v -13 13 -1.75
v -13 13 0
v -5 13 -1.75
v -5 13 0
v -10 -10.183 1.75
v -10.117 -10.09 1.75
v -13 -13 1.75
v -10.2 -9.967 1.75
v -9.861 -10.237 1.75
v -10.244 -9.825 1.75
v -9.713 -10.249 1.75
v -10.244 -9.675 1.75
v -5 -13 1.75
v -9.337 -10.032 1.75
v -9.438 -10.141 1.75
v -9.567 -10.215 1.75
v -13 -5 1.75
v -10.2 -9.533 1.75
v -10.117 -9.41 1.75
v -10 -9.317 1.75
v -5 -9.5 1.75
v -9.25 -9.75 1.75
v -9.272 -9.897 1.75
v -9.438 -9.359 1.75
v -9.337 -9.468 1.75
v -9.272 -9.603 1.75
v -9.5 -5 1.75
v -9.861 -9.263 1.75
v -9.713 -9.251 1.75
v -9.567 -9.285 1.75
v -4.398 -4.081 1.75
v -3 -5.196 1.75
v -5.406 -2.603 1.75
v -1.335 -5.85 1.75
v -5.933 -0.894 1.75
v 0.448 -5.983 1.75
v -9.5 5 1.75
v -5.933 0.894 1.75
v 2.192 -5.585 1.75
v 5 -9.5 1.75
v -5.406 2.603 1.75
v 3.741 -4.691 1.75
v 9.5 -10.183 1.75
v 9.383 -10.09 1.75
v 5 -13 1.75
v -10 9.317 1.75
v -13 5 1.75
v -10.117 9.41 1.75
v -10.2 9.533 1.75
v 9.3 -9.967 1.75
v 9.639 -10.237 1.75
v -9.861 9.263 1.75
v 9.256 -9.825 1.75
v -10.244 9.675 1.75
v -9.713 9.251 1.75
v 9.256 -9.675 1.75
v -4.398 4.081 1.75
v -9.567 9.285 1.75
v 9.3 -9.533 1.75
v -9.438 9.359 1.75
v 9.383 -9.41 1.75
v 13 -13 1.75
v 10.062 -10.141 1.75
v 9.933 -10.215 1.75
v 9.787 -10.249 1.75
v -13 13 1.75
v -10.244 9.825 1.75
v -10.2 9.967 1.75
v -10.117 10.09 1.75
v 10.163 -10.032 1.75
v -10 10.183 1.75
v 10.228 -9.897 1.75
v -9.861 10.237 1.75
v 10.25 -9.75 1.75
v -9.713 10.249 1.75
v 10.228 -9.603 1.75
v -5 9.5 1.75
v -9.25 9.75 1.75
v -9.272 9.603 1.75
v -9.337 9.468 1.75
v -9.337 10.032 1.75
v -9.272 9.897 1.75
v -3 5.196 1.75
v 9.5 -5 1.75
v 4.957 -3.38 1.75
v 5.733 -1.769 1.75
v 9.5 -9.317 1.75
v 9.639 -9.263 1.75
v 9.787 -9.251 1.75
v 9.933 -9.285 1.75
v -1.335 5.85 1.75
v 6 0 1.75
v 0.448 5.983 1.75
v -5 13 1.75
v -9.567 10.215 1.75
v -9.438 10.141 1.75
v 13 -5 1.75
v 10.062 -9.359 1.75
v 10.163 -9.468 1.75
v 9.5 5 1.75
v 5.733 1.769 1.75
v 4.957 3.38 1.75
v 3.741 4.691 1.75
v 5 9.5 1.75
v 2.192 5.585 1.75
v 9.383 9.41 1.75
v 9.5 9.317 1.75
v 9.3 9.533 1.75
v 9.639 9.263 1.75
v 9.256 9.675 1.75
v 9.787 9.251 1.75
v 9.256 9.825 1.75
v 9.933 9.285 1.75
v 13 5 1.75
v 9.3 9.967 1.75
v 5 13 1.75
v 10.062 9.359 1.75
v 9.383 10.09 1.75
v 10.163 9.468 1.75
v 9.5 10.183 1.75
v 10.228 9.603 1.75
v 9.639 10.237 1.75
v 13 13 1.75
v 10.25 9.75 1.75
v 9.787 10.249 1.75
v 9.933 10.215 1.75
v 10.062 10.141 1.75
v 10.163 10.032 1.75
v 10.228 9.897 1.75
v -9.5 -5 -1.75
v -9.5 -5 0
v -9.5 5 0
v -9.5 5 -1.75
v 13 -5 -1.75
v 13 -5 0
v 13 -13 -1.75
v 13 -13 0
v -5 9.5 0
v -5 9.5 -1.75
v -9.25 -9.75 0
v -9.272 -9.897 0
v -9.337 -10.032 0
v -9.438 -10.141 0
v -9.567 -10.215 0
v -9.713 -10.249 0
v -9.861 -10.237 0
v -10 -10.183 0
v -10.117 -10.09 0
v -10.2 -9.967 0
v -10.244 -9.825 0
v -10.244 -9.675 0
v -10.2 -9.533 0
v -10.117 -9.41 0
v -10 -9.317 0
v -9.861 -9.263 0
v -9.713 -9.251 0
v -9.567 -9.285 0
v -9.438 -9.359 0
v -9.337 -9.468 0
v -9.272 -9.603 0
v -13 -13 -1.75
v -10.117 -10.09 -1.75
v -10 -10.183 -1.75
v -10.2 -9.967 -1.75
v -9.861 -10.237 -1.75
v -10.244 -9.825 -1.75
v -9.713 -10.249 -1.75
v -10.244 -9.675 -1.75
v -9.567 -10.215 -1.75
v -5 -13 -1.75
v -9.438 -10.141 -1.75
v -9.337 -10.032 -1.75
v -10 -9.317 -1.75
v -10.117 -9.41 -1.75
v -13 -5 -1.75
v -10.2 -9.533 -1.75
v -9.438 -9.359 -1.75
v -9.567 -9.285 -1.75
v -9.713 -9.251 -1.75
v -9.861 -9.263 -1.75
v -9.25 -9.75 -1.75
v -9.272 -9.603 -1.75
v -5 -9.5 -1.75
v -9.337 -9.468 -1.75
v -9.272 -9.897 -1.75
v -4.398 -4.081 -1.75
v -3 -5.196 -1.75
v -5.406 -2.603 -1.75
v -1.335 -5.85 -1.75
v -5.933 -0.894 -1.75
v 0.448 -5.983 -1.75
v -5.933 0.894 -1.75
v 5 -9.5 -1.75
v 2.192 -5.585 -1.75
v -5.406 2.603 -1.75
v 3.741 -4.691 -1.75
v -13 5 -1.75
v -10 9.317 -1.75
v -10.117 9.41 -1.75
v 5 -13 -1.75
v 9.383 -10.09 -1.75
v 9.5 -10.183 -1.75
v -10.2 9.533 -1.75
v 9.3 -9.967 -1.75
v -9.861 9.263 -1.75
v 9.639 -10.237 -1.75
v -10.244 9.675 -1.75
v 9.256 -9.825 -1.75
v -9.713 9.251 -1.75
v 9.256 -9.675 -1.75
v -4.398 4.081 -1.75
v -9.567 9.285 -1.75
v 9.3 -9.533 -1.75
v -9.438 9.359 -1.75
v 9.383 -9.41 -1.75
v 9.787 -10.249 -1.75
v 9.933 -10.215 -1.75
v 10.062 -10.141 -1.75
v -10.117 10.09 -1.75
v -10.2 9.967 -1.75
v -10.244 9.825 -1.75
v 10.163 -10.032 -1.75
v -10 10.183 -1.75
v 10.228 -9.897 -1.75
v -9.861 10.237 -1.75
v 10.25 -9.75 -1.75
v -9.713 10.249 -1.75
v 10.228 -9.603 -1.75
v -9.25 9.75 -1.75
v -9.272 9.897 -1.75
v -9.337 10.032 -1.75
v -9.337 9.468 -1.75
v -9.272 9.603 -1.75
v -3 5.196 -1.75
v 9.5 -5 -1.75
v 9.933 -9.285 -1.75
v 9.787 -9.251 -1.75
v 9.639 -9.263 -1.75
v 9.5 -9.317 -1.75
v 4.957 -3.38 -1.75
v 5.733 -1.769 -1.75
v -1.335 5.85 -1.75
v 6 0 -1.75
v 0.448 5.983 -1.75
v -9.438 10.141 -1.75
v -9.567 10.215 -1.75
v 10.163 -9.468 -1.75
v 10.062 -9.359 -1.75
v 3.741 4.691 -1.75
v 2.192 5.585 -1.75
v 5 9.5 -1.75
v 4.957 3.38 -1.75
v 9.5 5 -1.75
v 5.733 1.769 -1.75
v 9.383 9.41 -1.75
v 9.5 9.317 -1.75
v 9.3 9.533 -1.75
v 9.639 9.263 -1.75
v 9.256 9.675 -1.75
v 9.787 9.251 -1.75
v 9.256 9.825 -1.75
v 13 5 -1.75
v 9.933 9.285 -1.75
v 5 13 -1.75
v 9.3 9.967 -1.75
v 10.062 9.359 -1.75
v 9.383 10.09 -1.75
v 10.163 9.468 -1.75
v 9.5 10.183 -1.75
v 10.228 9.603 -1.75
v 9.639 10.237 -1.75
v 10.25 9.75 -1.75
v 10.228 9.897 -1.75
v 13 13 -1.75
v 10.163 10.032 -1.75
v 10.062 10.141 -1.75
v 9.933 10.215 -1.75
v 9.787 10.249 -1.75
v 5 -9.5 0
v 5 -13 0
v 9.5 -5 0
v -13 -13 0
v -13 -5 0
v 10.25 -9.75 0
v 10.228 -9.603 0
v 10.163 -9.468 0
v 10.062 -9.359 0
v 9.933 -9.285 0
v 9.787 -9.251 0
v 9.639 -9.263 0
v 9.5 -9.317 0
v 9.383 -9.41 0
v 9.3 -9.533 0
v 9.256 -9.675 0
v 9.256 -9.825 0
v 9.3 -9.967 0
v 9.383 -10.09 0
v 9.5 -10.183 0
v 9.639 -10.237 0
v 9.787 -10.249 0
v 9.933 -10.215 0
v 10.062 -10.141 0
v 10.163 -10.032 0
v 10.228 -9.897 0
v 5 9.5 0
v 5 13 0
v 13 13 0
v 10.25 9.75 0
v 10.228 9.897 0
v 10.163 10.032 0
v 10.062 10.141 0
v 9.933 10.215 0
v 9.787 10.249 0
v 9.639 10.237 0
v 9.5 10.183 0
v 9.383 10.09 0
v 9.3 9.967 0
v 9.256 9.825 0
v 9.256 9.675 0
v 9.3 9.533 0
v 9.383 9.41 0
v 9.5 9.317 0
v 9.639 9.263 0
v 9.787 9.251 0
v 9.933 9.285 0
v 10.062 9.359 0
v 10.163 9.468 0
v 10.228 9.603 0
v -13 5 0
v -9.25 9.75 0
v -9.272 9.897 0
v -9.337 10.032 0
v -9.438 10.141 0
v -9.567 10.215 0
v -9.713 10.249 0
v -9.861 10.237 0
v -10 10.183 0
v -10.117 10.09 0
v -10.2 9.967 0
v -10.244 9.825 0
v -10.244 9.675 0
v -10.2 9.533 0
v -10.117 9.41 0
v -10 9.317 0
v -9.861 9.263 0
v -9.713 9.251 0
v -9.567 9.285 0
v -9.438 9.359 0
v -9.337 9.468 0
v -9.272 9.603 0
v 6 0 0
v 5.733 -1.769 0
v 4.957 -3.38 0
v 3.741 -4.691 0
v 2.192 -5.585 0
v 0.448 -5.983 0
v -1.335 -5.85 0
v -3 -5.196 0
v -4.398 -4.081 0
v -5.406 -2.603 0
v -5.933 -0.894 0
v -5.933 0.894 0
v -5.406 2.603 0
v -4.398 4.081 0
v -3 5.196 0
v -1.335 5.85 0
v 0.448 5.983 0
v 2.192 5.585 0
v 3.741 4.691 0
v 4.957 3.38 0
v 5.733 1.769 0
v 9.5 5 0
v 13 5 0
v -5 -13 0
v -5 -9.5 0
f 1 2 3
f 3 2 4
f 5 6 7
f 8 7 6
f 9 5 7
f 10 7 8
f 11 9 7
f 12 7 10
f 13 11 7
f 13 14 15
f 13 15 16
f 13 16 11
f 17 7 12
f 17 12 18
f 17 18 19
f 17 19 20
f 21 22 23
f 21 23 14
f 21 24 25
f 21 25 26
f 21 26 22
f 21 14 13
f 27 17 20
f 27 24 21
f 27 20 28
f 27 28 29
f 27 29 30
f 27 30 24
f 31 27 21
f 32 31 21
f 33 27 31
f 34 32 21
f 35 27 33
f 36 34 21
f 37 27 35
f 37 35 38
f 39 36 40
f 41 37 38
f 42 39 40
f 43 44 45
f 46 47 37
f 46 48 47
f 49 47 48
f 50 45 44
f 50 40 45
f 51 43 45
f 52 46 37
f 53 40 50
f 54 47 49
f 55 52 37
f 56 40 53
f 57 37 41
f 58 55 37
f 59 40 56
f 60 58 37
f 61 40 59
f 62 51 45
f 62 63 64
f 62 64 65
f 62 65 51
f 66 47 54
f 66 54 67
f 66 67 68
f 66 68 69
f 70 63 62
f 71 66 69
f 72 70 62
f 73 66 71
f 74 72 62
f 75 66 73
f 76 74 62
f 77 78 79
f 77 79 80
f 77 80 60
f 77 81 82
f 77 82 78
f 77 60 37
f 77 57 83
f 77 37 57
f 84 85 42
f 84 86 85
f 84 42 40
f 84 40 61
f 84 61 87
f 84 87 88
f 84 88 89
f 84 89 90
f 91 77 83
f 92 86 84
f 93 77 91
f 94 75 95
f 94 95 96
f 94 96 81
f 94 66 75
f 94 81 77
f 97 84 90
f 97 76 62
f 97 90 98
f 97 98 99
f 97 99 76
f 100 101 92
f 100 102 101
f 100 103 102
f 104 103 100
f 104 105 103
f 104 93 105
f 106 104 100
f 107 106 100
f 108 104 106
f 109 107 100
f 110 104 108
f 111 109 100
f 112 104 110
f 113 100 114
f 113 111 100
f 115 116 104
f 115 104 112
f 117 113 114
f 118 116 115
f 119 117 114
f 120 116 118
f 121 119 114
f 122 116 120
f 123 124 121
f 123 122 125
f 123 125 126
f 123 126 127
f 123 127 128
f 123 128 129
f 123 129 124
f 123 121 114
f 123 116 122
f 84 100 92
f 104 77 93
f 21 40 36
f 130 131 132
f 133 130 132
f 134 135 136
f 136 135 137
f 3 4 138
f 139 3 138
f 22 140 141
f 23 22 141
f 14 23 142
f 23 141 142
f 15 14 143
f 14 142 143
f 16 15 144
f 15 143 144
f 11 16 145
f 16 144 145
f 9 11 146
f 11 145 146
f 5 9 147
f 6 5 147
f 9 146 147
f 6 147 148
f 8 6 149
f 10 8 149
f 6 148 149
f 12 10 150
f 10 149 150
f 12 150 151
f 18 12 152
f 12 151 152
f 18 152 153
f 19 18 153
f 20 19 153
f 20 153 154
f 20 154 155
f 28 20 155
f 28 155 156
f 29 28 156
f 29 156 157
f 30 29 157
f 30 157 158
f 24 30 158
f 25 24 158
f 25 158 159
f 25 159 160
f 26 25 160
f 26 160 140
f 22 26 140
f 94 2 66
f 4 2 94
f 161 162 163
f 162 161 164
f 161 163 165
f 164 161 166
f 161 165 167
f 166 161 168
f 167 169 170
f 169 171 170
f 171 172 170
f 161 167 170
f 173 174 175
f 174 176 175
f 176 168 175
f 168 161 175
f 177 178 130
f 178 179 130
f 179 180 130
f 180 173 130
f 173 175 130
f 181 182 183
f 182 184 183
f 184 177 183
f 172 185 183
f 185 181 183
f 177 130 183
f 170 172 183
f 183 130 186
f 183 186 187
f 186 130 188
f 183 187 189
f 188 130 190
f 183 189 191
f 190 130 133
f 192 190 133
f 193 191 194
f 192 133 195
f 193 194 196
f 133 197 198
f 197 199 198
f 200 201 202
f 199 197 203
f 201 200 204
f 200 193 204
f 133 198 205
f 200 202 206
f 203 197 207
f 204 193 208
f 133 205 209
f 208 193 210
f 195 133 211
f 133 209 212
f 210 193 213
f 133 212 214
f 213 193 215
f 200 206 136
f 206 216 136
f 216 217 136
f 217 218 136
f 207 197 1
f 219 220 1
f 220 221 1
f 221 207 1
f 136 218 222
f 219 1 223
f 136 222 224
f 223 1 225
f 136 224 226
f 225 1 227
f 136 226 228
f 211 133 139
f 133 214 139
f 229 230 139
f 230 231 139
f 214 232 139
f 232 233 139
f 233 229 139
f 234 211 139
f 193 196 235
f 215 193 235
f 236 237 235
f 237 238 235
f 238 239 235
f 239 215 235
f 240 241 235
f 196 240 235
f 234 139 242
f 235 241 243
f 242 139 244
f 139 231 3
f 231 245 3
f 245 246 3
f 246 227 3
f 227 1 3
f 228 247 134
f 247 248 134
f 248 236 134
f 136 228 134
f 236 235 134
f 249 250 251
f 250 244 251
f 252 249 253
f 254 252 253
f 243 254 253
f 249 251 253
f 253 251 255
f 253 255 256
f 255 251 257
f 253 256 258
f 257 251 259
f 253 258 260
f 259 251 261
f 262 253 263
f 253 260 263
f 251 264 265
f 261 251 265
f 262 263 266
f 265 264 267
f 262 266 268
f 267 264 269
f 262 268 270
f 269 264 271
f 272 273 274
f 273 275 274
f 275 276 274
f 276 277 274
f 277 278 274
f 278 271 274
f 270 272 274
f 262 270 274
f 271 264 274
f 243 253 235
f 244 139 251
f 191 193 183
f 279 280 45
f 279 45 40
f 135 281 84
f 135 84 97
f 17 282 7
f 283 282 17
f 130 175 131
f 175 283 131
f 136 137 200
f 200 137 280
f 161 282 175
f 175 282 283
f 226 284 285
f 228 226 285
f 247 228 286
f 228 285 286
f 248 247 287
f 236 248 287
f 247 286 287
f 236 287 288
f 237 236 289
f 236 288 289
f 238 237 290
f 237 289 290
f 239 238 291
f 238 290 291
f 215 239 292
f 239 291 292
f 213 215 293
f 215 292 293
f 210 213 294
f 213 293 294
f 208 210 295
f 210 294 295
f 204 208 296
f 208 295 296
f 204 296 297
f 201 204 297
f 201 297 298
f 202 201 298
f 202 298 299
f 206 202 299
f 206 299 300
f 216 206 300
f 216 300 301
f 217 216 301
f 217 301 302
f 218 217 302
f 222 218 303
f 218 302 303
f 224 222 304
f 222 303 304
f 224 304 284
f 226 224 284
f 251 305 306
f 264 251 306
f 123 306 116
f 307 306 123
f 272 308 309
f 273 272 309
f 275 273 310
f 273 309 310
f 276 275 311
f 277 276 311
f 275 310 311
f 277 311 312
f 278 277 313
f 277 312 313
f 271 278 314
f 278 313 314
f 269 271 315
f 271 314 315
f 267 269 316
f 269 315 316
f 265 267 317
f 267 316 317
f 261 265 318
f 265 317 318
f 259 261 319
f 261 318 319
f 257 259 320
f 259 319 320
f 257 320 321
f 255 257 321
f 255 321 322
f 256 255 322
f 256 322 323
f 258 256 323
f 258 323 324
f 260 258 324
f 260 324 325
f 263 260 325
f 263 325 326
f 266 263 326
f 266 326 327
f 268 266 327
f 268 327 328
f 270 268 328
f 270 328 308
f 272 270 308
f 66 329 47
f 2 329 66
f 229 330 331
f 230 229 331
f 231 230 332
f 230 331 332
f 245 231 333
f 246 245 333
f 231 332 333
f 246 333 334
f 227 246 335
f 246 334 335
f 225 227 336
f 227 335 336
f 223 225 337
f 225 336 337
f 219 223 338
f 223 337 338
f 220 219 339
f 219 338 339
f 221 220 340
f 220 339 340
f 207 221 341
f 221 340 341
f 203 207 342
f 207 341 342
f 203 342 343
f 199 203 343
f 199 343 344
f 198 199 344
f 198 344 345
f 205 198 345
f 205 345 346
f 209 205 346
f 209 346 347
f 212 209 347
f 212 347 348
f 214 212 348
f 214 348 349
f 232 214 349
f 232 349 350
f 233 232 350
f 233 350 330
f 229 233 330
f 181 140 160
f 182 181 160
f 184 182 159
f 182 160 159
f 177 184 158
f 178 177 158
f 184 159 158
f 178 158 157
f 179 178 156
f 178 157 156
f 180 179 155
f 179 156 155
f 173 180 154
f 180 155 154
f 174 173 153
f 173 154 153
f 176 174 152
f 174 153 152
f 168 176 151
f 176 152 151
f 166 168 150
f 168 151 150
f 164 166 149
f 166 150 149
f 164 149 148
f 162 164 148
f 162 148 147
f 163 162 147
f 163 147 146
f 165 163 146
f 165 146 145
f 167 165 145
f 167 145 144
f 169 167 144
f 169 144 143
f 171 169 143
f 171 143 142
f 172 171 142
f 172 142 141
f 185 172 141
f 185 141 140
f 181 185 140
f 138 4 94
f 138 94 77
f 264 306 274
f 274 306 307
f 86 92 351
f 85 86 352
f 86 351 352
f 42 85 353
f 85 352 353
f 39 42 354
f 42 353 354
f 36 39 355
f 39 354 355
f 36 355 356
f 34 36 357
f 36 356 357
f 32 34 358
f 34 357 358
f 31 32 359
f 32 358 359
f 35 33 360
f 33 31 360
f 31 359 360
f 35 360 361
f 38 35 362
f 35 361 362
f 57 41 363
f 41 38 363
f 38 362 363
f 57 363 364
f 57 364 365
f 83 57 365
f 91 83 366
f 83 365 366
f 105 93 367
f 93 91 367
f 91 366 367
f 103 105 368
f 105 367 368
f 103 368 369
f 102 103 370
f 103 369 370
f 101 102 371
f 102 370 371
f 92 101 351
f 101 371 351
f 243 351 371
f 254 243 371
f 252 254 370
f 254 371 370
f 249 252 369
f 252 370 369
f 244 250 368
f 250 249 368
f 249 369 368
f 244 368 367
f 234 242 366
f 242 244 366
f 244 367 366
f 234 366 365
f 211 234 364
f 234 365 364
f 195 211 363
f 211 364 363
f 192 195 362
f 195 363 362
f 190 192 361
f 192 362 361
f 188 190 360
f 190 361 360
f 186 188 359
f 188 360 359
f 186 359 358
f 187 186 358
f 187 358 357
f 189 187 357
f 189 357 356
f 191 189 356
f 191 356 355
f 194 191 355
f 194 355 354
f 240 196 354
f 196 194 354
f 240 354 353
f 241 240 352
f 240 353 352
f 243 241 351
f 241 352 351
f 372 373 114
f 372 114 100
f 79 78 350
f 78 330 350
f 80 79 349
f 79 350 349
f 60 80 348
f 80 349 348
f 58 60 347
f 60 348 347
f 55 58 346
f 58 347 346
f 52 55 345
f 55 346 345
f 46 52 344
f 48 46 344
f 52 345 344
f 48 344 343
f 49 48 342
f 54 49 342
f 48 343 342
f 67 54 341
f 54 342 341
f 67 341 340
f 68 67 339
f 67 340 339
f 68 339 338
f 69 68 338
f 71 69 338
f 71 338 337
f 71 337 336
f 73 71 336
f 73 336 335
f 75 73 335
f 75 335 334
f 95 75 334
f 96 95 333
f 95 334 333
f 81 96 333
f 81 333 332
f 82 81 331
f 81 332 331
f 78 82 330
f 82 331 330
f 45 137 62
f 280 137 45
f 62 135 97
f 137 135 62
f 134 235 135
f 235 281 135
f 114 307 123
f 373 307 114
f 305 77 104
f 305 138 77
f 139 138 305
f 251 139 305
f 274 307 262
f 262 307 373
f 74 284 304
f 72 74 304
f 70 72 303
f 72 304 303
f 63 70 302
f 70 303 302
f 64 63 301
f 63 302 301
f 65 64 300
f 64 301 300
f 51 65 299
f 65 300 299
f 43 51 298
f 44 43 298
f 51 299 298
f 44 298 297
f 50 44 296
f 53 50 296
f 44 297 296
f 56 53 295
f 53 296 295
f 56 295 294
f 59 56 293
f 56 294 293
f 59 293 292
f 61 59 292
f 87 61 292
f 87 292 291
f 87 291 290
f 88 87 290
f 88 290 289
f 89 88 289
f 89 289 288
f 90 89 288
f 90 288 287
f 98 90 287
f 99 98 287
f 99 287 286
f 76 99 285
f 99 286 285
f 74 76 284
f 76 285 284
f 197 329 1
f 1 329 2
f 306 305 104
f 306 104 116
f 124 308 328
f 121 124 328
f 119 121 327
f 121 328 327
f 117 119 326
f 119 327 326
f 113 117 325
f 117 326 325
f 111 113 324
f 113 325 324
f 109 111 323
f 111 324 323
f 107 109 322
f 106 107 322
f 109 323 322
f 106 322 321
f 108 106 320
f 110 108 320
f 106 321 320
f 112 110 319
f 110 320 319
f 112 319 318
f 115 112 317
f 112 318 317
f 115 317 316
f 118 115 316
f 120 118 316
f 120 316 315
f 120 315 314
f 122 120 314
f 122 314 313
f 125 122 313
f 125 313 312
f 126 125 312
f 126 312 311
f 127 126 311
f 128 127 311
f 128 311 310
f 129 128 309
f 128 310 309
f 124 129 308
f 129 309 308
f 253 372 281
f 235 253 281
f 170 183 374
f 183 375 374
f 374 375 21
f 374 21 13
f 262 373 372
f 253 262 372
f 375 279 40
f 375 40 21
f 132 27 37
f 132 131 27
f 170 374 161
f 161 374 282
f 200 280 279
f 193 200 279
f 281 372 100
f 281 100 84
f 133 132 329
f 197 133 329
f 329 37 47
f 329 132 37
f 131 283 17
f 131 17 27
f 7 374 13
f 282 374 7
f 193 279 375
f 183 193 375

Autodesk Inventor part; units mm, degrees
ref_plane "YZ Plane" through (0, 0, 0) normal (1, 0, 0) x (0, 1, 0)
ref_plane "XZ Plane" through (0, 0, 0) normal (0, 1, 0) x (-1, 0, 0)
ref_plane "XY Plane" through (0, 0, 0) normal (0, 0, 1) x (1, 0, 0)
sketch "Sketch1" plane through (0, 0, 0) normal (0, 0, 1) x (1, 0, 0)
  circle A0 centre (0, 0) radius 6
  line L0 (-13, 13) -> (13, 13)
  line L1 (13, 13) -> (13, -13)
  line L2 (13, -13) -> (-13, -13)
  line L3 (-13, -13) -> (-13, 13)
  line L4 (0, 0) -> (13, 13)
  line L5 (6.5, 6.5) -> (13, 13)
  circle A1 centre (9.75, 9.75) radius 0.5
  line L6 (0, 0) -> (-13, 13)
  line L7 (-6.5, 6.5) -> (-13, 13)
  circle A2 centre (-9.75, 9.75) radius 0.5
  line L8 (0, 0) -> (-13, -13)
  line L9 (-6.5, -6.5) -> (-13, -13)
  circle A3 centre (-9.75, -9.75) radius 0.5
  line L10 (0, 0) -> (13, -13)
  line L11 (6.5, -6.5) -> (13, -13)
  circle A4 centre (9.75, -9.75) radius 0.5
  line L12 (-5, -13) -> (5, -13)
  line L13 (5, -13) -> (5, -9.5)
  line L14 (5, -9.5) -> (-5, -9.5)
  line L15 (-5, -9.5) -> (-5, -13)
  line L16 (13, 5) -> (9.5, 5)
  line L17 (9.5, 5) -> (9.5, -5)
  line L18 (9.5, -5) -> (13, -5)
  line L19 (-5, 13) -> (-5, 9.5)
  line L20 (-5, 9.5) -> (5, 9.5)
  line L21 (5, 9.5) -> (5, 13)
  line L22 (-13, -5) -> (-9.5, -5)
  line L23 (-9.5, -5) -> (-9.5, 5)
  line L24 (-9.5, 5) -> (-13, 5)
  point P0 (0, 13)
  point P1 (13, 0)
  point P2 (0, -9.5)
  point P3 (0, -13)
  point P4 (9.5, 0)
  point P5 (0, 9.5)
  point P6 (-9.5, 0)
  dimension "d0" = 12
  dimension "d1" = 26
  dimension "d2" = 26
  dimension "d3" = 1
  dimension "d6" = 360
  dimension "d10" = 10
  dimension "d11" = 3.5
  dimension "d14" = 360
extrude "Extrusion1" add sketch "Sketch1" along normal mid plane 3.5 contours A0 L4 A1 L1 L16 L17 L18 L10 A4 | A0 L6 A2 L0 L19 L20 L21 L4 A1 | L10 A4 L2 L13 L14 L15 L8 A3 A0 | A0 L8 A3 L3 L22 L23 L24 L6 A2
equation "\"d2\" = d1"
properties part number "Spodnji del - Drzalo za pismo"
